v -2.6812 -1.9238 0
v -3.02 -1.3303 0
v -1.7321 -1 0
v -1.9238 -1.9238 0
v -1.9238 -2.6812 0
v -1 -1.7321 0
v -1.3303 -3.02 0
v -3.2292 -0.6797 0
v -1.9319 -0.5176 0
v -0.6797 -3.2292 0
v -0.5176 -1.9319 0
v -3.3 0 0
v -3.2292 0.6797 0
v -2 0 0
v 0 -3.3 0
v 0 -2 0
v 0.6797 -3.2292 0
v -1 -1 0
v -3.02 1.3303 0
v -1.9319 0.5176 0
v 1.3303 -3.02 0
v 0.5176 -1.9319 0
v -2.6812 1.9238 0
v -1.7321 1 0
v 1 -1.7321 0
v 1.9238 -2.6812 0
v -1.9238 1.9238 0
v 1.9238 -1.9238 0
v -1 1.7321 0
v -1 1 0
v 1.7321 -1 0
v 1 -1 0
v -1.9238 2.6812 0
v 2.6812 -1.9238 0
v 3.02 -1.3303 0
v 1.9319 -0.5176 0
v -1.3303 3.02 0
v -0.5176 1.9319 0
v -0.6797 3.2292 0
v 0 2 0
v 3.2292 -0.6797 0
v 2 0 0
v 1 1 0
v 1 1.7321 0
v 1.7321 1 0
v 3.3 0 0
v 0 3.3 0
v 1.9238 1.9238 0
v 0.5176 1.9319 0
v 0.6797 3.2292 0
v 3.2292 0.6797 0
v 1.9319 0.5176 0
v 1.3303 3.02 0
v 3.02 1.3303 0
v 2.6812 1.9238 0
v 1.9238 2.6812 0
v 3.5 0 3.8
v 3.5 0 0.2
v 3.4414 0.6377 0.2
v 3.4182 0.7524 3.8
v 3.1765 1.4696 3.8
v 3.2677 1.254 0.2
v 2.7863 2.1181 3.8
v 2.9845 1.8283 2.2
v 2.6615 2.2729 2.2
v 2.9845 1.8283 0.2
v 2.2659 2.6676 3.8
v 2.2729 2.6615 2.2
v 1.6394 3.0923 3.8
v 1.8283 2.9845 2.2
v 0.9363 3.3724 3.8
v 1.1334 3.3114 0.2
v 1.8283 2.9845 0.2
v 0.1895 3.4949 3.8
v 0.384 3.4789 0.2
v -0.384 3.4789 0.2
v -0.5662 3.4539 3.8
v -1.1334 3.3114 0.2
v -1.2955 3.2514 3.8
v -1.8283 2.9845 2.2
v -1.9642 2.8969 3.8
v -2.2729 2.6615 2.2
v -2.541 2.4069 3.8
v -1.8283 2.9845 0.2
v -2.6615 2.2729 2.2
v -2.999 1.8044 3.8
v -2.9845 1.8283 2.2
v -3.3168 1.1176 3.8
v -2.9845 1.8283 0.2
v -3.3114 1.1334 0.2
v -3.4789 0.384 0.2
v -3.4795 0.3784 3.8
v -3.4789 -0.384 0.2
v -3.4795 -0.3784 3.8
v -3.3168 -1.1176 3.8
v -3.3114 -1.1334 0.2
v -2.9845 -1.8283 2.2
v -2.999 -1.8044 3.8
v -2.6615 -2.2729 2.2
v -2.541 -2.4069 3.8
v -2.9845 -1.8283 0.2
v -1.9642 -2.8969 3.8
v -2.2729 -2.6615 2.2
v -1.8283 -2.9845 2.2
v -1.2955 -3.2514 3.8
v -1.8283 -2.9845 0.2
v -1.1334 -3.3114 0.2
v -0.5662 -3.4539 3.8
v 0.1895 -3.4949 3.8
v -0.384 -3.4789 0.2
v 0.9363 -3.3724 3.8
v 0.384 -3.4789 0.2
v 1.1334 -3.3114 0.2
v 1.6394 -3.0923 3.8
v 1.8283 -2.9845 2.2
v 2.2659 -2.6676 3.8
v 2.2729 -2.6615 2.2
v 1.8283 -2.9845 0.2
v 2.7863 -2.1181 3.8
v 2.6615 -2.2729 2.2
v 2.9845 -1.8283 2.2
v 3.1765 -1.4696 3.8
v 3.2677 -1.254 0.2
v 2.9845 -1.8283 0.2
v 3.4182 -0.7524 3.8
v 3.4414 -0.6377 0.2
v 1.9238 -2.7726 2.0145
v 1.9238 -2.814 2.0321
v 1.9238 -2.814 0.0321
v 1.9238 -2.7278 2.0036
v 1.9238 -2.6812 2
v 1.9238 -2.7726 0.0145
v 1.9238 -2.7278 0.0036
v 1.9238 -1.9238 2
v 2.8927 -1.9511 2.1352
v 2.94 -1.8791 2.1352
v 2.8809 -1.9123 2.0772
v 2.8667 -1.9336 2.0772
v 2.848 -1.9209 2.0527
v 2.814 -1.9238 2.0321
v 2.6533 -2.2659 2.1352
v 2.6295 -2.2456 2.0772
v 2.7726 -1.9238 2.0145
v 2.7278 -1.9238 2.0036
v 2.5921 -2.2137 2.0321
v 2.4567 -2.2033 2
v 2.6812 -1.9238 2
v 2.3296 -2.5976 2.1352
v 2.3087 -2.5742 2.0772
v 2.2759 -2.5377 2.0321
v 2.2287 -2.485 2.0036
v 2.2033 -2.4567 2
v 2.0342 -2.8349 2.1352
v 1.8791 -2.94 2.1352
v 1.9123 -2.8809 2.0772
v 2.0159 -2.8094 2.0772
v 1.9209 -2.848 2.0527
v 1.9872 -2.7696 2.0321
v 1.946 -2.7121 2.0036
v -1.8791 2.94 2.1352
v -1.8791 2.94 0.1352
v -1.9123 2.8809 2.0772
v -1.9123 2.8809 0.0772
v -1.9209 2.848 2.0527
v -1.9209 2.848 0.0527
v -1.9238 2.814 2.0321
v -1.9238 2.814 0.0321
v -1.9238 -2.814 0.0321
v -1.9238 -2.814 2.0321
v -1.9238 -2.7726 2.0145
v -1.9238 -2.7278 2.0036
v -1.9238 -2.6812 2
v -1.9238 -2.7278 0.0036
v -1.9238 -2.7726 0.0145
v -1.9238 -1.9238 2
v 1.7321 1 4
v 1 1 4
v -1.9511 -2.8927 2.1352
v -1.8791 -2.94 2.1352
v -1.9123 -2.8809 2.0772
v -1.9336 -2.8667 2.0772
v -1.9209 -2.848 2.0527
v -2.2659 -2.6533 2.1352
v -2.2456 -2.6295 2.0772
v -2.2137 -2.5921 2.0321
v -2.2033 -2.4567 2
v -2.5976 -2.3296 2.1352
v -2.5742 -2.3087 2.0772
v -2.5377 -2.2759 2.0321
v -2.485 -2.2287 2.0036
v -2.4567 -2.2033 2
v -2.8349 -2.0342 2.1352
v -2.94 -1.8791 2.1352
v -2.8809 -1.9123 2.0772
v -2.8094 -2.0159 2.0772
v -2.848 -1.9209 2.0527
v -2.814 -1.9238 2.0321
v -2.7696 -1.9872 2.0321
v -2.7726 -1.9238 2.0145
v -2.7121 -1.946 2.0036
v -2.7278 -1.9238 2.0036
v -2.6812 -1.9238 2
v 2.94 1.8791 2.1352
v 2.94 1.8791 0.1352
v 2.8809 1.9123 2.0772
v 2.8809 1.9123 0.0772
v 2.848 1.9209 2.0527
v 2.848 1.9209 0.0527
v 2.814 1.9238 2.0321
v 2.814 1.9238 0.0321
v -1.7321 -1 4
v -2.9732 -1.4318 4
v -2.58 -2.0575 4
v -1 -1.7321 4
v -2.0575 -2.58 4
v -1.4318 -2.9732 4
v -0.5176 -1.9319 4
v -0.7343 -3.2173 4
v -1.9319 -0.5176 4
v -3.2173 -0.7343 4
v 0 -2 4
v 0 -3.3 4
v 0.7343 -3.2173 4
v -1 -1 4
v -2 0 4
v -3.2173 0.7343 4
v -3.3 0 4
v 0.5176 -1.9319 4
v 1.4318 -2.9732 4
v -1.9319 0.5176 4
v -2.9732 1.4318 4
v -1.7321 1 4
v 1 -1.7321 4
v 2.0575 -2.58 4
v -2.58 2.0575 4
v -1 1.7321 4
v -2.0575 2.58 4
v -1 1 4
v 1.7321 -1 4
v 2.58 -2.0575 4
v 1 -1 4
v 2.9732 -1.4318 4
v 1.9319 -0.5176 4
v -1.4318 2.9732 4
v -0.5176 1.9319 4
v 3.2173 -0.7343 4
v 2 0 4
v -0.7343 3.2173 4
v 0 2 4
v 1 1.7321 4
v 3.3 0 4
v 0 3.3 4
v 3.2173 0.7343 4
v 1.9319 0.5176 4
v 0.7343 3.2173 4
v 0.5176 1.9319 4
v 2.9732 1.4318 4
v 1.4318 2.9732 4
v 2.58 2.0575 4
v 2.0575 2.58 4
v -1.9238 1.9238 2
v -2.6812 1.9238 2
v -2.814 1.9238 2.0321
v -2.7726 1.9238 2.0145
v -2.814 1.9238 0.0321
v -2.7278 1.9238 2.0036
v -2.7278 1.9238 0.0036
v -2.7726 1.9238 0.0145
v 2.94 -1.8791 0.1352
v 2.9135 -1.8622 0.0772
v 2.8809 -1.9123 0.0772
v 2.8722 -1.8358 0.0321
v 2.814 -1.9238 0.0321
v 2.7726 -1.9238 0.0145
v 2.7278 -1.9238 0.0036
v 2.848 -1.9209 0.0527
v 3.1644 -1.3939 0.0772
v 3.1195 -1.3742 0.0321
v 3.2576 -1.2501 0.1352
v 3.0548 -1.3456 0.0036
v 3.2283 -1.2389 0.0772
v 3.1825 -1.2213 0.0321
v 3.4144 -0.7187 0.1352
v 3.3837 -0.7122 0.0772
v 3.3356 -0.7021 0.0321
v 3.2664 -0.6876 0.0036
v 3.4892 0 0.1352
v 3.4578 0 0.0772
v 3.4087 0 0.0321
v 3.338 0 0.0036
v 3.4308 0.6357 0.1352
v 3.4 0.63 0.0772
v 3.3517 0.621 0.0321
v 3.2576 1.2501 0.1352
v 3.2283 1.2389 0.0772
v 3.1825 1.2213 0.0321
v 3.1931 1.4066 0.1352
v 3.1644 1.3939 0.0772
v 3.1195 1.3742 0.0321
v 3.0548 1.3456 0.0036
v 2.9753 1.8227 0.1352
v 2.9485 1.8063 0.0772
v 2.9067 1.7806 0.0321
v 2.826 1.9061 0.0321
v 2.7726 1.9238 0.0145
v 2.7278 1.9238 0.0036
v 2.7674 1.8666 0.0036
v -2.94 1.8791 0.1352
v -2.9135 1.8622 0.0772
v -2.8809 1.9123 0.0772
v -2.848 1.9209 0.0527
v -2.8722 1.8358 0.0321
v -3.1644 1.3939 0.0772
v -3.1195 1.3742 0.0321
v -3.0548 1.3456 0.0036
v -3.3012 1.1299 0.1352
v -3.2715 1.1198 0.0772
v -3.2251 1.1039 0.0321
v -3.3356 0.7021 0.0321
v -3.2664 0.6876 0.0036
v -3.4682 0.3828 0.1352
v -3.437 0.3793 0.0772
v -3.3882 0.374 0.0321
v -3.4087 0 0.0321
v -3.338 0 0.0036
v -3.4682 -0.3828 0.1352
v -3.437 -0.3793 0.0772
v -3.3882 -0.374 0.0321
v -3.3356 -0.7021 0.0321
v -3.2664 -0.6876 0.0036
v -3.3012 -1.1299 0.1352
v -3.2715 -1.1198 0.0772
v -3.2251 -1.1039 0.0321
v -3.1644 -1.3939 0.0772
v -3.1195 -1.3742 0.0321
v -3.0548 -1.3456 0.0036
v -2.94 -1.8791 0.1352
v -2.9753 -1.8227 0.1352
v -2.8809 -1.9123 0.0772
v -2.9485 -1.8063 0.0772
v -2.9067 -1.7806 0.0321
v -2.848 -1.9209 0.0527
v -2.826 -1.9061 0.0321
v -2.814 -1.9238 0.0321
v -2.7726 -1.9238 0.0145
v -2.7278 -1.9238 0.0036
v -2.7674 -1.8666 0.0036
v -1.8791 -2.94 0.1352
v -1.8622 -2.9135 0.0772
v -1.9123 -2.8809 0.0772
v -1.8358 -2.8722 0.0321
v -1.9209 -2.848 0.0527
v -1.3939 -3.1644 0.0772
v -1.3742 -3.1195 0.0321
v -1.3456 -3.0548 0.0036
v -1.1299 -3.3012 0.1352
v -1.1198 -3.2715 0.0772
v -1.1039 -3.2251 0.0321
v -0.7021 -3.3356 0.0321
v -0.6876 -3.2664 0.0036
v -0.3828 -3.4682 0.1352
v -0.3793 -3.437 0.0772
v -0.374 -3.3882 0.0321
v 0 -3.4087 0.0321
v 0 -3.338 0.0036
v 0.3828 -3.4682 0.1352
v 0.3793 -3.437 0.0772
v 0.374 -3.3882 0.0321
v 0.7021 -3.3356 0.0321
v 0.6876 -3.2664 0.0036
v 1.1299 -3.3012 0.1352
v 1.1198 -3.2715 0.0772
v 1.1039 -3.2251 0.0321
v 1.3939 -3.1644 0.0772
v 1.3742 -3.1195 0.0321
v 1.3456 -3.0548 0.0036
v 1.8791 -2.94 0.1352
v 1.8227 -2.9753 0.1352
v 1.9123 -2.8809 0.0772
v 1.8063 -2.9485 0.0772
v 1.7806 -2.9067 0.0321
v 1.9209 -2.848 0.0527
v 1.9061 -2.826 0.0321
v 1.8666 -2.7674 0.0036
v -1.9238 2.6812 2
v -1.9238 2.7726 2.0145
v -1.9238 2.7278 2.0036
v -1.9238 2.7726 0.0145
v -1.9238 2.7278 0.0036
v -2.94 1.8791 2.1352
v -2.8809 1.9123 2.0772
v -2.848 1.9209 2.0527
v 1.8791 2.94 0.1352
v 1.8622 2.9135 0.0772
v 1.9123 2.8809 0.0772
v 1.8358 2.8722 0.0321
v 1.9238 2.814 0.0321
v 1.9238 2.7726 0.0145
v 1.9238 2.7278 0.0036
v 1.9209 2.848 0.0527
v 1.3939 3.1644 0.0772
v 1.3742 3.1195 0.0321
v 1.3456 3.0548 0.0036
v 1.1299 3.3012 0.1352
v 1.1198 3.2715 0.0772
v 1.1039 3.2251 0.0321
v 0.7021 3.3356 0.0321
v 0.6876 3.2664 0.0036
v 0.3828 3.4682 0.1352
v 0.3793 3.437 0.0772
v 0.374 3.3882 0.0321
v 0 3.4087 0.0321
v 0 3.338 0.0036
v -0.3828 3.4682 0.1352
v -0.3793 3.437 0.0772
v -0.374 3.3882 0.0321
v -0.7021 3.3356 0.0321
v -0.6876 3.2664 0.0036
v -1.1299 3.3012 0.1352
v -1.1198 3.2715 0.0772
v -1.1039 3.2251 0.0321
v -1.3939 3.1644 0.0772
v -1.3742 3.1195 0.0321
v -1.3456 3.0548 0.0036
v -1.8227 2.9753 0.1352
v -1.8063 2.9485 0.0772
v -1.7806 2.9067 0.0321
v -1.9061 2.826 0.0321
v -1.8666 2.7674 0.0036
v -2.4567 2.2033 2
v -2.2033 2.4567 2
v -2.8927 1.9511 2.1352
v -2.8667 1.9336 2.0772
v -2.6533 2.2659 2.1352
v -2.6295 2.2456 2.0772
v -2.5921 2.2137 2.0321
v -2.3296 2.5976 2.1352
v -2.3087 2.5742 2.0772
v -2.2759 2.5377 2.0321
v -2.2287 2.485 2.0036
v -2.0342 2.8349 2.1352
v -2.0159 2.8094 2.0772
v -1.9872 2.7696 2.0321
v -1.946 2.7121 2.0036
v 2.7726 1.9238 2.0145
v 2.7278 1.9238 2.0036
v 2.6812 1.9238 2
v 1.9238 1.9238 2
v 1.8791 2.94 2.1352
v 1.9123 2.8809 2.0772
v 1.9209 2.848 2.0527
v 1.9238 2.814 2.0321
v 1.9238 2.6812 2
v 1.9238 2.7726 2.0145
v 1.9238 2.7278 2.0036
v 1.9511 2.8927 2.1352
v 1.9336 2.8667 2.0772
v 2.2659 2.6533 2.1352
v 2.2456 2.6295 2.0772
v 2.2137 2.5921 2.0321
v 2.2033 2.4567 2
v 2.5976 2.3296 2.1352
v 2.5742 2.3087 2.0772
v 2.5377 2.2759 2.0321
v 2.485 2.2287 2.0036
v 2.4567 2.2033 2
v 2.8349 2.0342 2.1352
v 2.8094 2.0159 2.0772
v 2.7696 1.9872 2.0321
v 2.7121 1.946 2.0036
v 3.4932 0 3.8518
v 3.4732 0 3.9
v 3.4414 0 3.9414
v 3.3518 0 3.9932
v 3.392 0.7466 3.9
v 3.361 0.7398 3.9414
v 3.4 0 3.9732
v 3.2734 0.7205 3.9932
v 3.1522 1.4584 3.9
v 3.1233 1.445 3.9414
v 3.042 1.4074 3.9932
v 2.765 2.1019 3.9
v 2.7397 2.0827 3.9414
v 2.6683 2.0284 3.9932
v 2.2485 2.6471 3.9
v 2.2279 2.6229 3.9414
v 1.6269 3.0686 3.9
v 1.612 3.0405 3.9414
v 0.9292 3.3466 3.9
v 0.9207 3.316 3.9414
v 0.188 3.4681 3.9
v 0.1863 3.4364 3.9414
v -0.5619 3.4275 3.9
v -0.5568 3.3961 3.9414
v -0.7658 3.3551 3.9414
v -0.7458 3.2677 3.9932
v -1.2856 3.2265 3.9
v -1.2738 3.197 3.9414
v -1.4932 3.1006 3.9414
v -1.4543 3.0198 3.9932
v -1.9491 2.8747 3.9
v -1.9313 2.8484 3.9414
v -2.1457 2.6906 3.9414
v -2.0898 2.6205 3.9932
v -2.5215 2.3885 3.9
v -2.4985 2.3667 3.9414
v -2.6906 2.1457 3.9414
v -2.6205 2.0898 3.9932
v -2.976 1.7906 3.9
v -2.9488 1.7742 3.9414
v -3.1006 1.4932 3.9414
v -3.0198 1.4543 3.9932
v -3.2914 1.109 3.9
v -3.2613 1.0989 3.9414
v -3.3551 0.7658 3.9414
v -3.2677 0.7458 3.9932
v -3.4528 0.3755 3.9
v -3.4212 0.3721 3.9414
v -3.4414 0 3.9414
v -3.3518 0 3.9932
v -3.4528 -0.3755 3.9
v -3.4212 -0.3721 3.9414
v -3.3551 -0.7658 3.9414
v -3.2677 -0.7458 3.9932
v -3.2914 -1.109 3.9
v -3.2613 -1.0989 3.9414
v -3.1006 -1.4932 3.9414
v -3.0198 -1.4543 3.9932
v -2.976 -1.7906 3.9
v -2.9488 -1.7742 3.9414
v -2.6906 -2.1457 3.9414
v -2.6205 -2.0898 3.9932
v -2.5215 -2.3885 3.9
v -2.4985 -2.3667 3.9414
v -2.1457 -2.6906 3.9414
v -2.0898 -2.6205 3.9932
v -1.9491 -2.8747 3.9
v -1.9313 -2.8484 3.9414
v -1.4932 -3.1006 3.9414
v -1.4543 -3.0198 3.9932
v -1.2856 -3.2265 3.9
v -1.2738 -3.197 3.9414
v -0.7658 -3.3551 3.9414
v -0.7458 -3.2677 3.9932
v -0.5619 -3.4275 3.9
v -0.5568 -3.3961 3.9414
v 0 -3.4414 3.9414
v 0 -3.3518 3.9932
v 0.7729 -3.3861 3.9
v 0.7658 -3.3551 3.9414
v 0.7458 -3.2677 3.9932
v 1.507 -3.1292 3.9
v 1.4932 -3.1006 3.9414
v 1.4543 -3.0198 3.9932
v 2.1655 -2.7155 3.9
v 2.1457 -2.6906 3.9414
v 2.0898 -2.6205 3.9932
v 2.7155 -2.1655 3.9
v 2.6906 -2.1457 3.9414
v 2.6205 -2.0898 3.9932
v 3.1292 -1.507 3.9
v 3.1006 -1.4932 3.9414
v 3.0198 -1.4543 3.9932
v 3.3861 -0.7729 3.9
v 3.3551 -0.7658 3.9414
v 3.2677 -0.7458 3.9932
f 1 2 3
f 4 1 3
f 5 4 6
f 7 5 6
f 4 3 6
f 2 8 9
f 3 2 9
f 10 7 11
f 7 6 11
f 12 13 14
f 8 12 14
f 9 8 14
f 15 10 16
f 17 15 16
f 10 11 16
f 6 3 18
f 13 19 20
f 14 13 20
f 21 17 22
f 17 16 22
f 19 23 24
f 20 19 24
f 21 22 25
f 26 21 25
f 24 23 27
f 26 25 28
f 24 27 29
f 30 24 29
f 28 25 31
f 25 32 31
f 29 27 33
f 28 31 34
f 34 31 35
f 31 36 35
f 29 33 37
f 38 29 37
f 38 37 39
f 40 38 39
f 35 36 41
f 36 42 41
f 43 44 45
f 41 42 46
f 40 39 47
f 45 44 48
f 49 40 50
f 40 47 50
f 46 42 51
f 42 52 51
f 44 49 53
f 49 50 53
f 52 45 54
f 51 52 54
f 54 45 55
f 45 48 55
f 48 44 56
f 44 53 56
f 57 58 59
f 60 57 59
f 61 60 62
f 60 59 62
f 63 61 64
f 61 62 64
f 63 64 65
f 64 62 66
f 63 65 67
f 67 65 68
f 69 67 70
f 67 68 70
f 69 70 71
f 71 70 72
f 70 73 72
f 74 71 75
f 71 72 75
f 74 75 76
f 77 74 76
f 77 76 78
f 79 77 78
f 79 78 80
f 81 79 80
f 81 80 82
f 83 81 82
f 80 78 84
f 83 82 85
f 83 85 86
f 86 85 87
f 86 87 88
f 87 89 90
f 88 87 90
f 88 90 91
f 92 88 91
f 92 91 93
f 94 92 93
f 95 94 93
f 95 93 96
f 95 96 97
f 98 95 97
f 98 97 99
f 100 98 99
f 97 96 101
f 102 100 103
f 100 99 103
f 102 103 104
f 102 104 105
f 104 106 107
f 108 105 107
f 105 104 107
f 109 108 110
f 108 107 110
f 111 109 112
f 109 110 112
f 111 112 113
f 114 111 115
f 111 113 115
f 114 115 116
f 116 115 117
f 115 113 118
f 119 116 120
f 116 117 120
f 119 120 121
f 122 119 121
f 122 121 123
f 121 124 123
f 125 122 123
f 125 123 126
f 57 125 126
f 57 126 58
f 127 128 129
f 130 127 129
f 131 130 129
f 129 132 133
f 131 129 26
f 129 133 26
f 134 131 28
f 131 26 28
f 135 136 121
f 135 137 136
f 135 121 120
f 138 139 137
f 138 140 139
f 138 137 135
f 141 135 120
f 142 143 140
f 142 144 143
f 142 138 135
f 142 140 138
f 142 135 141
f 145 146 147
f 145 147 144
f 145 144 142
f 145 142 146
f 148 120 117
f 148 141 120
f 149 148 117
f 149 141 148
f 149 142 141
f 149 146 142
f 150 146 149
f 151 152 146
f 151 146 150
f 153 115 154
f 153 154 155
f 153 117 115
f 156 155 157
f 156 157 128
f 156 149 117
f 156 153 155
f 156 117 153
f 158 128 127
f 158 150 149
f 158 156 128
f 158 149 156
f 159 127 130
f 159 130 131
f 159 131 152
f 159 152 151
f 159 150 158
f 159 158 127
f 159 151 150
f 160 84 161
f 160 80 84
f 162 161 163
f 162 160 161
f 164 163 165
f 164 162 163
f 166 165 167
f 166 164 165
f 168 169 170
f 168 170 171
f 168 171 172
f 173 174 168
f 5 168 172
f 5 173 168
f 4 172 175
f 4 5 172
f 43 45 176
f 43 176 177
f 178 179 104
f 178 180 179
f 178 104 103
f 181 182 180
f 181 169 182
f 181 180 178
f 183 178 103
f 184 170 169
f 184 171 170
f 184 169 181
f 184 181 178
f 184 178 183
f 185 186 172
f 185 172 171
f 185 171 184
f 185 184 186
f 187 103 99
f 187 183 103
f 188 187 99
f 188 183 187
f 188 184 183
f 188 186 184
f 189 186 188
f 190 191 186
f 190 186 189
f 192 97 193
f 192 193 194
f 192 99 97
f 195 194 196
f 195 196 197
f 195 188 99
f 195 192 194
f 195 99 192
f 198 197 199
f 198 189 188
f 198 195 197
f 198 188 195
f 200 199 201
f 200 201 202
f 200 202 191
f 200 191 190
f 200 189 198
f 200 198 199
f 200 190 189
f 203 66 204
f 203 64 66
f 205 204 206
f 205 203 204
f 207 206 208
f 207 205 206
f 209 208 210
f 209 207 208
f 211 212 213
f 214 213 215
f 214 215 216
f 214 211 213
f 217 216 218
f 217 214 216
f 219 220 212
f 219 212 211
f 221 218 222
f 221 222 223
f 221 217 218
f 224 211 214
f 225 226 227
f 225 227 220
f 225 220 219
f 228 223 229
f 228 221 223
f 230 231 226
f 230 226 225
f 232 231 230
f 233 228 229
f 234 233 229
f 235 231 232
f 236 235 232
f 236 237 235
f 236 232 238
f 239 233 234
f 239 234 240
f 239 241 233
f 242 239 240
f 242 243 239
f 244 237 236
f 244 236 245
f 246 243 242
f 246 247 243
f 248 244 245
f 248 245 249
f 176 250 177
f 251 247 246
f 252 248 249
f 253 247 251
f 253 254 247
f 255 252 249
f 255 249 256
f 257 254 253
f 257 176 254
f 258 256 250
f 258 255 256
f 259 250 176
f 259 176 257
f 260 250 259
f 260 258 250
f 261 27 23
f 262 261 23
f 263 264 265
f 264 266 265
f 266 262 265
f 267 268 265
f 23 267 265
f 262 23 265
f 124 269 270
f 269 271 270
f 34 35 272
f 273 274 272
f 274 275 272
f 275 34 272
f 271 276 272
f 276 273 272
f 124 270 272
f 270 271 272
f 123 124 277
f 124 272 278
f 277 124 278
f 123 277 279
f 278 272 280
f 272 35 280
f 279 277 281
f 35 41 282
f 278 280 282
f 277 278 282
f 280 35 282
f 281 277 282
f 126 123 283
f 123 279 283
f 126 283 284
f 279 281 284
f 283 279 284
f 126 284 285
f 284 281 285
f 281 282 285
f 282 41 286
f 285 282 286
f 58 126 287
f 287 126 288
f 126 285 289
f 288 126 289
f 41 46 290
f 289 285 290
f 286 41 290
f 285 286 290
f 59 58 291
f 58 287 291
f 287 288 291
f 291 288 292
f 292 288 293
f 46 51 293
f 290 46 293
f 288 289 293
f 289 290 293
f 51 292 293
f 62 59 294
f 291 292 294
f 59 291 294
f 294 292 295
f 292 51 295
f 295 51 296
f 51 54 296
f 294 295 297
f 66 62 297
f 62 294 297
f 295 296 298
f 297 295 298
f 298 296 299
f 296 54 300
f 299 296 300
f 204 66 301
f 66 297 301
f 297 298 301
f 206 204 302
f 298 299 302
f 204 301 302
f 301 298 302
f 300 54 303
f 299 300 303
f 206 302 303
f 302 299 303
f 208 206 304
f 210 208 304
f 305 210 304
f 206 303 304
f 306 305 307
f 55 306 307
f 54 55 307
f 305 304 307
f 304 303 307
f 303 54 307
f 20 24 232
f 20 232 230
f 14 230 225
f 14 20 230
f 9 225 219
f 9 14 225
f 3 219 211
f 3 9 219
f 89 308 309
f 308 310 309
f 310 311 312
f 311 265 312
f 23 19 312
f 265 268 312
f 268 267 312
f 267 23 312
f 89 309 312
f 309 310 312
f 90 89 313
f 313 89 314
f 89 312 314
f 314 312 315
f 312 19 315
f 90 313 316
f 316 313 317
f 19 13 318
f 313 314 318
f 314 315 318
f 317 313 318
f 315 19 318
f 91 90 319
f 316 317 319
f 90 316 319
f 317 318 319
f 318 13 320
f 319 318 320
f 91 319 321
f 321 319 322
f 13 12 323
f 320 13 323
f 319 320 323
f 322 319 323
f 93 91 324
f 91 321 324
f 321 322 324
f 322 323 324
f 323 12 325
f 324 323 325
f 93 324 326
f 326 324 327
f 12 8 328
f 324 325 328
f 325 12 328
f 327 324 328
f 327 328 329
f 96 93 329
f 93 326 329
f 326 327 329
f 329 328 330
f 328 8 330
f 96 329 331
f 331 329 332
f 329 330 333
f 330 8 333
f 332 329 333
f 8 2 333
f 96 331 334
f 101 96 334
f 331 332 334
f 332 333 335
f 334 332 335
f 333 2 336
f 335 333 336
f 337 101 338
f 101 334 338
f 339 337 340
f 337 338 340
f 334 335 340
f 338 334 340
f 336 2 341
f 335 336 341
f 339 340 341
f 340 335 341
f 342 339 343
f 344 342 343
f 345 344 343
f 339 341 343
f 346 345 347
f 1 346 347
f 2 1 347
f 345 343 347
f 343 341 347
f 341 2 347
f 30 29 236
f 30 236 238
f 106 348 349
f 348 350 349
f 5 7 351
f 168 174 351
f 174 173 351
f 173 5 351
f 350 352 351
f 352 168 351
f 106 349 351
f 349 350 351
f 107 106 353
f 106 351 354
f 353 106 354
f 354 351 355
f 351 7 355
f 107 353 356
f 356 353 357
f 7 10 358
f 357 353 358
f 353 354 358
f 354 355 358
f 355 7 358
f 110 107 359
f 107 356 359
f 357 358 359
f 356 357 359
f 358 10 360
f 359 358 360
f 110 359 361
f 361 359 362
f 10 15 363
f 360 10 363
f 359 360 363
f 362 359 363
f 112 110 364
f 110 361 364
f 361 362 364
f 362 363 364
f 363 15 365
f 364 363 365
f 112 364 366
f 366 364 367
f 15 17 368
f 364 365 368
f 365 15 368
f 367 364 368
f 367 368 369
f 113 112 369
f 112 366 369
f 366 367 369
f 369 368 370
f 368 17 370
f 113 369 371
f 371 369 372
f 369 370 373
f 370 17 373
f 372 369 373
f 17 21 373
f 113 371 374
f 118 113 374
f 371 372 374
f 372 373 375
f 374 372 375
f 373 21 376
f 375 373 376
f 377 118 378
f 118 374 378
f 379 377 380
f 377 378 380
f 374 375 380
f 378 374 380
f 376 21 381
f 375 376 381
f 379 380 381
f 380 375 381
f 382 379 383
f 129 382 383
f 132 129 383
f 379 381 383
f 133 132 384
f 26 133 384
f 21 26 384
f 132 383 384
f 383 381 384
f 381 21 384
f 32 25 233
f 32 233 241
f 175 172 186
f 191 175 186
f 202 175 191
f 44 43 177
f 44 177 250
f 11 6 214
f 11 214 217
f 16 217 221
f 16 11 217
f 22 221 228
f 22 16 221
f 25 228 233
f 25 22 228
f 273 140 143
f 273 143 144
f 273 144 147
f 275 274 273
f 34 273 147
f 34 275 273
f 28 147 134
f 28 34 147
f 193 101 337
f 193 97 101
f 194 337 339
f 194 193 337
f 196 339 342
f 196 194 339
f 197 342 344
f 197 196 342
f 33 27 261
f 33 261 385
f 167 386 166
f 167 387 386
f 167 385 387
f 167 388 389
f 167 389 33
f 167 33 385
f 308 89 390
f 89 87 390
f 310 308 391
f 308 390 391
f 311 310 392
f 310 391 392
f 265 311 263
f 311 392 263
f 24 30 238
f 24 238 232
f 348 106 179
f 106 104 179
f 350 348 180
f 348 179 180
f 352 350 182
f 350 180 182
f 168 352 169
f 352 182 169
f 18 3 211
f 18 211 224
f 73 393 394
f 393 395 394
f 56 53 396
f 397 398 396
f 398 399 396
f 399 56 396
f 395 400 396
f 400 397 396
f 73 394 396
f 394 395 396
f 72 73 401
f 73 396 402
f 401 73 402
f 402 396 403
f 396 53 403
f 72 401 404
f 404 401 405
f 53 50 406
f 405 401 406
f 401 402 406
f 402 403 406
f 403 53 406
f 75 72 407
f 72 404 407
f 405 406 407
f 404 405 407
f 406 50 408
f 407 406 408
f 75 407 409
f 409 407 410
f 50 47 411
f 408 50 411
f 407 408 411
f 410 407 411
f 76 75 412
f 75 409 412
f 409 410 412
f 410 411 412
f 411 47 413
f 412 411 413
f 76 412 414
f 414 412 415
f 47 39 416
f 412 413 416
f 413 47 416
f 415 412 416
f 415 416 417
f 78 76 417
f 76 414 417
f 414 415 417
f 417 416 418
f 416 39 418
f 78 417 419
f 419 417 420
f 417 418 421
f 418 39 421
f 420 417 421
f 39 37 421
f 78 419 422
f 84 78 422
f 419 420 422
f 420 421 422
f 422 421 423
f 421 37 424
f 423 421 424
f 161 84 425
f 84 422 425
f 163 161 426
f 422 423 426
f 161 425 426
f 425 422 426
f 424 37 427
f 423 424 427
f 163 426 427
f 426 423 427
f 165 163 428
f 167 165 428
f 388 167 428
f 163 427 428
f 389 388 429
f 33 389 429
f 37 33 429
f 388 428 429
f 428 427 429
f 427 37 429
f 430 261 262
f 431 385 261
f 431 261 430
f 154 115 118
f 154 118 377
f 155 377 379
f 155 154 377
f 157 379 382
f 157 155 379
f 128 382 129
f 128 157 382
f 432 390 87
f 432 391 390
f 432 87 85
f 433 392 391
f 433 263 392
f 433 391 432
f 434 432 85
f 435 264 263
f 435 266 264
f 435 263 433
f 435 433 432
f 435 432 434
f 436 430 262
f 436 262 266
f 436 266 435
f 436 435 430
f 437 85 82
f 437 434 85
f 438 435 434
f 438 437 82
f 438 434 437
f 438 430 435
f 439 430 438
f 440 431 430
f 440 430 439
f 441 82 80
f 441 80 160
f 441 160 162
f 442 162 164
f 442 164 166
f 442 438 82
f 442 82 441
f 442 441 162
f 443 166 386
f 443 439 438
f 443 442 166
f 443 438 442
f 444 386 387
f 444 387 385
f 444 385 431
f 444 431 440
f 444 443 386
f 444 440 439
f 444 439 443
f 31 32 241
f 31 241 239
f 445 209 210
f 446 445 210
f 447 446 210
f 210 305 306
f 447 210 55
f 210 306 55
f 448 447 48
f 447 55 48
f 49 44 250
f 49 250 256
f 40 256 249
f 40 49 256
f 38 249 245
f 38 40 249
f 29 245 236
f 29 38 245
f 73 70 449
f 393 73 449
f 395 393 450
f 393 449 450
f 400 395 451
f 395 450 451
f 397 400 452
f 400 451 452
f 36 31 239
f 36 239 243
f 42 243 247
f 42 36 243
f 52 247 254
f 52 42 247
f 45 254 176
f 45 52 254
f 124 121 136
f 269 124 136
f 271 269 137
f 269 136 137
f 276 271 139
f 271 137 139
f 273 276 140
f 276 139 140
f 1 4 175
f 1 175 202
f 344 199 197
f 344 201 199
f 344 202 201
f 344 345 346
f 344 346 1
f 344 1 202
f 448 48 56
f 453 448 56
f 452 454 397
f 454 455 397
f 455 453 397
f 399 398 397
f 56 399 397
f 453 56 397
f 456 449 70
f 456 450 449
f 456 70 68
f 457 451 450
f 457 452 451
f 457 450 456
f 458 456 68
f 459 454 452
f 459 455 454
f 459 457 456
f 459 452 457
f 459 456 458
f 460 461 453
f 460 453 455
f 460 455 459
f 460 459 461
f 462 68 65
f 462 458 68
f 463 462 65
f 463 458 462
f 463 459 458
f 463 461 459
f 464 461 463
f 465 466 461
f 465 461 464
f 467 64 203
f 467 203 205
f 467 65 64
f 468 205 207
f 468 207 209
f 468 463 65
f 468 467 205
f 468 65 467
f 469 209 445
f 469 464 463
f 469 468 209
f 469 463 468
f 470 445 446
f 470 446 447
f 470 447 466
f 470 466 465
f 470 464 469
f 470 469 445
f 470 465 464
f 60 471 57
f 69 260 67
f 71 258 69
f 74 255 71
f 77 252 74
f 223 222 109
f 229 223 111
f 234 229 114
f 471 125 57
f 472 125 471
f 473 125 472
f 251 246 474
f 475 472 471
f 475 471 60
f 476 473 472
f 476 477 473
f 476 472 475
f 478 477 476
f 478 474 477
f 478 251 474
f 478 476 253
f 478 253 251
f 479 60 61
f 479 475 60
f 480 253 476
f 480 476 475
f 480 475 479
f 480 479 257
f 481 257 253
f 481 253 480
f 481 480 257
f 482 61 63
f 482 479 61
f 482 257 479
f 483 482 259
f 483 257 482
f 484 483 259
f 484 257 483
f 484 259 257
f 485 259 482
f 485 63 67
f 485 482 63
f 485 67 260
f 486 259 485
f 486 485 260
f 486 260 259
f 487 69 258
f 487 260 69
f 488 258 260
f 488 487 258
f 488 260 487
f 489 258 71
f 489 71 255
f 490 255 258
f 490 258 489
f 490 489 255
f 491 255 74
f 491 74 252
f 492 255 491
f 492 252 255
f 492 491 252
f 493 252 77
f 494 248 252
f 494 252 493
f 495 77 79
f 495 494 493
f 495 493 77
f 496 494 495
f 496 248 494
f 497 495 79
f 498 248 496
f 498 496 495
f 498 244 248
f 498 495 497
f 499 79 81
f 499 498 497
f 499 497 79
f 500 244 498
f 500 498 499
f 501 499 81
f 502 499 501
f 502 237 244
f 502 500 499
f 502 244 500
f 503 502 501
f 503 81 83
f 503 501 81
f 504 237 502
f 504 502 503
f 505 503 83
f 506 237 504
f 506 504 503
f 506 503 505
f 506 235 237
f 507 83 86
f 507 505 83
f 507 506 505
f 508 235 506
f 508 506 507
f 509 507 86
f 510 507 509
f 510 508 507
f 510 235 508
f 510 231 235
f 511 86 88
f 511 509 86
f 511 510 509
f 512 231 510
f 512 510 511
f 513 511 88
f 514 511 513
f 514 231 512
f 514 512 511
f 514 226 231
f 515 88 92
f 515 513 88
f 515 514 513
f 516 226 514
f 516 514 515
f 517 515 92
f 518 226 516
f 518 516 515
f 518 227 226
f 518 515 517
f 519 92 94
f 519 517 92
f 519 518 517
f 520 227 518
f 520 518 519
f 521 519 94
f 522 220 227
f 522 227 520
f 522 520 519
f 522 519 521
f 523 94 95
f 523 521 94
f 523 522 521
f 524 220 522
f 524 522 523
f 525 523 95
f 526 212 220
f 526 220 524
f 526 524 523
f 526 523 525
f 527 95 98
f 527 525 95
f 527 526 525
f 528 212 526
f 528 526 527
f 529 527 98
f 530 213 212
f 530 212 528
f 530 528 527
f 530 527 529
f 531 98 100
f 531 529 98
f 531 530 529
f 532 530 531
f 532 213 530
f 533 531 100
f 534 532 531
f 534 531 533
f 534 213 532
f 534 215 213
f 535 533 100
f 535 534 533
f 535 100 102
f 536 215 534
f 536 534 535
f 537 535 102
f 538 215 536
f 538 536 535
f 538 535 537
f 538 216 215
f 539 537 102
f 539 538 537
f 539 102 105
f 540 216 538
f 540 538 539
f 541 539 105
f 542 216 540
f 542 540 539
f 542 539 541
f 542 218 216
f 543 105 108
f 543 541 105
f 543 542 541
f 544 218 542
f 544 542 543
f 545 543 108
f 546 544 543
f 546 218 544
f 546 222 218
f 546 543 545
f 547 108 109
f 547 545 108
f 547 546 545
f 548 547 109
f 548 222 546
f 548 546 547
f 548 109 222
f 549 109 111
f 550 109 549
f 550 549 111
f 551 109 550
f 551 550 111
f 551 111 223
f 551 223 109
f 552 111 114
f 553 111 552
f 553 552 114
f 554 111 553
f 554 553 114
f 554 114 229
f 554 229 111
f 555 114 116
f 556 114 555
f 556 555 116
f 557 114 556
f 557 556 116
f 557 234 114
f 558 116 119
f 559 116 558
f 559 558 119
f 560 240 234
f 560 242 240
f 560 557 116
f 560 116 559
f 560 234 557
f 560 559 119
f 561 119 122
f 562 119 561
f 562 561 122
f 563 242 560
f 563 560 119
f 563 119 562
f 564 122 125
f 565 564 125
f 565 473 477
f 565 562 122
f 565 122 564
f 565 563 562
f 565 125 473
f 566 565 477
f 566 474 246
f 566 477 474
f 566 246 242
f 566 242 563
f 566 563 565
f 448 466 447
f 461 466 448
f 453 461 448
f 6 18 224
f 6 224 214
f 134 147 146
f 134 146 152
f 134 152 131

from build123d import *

# Parameters (mm, degrees)
SKETCH1_R           = 3.5
BOSS_EXTRUDE1_DEPTH = 4
SKETCH2_W           = 1
SKETCH2_H           = 1
CUT_EXTRUDE1_DEPTH  = 2
FILLET1_R           = 0.2


with BuildPart() as part:
    # Sketch1 → Boss-Extrude1 (new body)
    with BuildSketch(Plane.XY):
        Circle(SKETCH1_R)
        with BuildLine():
            Line((1, -1), (1.732050808, -1))
            ThreePointArc((1.732050808, -1), (2, 0), (1.732050808, 1))
            Line((1.732050808, 1), (1, 1))
            Line((1, 1), (1, 1.732050808))
            ThreePointArc((1, 1.732050808), (0, 2), (-1, 1.732050808))
            Line((-1, 1.732050808), (-1, 1))
            Line((-1, 1), (-1.732050808, 1))
            ThreePointArc((-1.732050808, 1), (-2, 0), (-1.732050808, -1))
            Line((-1.732050808, -1), (-1, -1))
            Line((-1, -1), (-1, -1.732050808))
            ThreePointArc((-1, -1.732050808), (0, -2), (1, -1.732050808))
            Line((1, -1.732050808), (1, -1))
        make_face(mode=Mode.SUBTRACT)
    extrude(amount=BOSS_EXTRUDE1_DEPTH)

    # Sketch2 → Cut-Extrude1 (cut)
    with BuildSketch(Plane(origin=(0, 0, 0), x_dir=(-1, 0, 0), z_dir=(0, 0, -1))):
        with Locations((-2.423839929, 2.423839929)):
            Rectangle(SKETCH2_W, SKETCH2_H)
        with Locations((-2.423839929, -2.423839929)):
            Rectangle(SKETCH2_W, SKETCH2_H)
        with Locations((2.423839929, -2.423839929)):
            Rectangle(SKETCH2_W, SKETCH2_H)
        with Locations((2.423839929, 2.423839929)):
            Rectangle(SKETCH2_W, SKETCH2_H)
    extrude(amount=-CUT_EXTRUDE1_DEPTH, mode=Mode.SUBTRACT)

    # Fillet1
    fillet1_edges = [part.edges().sort_by_distance(p)[0] for p in [
        (0, 3.5, 0),
        (-3.5, 0, 0),
        (0, -3.5, 0),
        (3.352867411, 1.004131528, 0),
        (2.474873734, 2.474873734, 2),
        (2.474873734, -2.474873734, 2),
        (-3.5, 0, 4),
        (-2.474873734, -2.474873734, 2),
        (-2.474873734, 2.474873734, 2),
        (-2.923839929, 1.923839929, 1),
        (-1.923839929, 2.923839929, 1),
        (-1.923839929, -2.923839929, 1),
        (-2.923839929, -1.923839929, 1),
        (2.923839929, -1.923839929, 1),
        (1.923839929, -2.923839929, 1),
        (2.923839929, 1.923839929, 1),
        (1.923839929, 2.923839929, 1),
    ]]
    fillet(fillet1_edges, radius=FILLET1_R)


solid = part.part
